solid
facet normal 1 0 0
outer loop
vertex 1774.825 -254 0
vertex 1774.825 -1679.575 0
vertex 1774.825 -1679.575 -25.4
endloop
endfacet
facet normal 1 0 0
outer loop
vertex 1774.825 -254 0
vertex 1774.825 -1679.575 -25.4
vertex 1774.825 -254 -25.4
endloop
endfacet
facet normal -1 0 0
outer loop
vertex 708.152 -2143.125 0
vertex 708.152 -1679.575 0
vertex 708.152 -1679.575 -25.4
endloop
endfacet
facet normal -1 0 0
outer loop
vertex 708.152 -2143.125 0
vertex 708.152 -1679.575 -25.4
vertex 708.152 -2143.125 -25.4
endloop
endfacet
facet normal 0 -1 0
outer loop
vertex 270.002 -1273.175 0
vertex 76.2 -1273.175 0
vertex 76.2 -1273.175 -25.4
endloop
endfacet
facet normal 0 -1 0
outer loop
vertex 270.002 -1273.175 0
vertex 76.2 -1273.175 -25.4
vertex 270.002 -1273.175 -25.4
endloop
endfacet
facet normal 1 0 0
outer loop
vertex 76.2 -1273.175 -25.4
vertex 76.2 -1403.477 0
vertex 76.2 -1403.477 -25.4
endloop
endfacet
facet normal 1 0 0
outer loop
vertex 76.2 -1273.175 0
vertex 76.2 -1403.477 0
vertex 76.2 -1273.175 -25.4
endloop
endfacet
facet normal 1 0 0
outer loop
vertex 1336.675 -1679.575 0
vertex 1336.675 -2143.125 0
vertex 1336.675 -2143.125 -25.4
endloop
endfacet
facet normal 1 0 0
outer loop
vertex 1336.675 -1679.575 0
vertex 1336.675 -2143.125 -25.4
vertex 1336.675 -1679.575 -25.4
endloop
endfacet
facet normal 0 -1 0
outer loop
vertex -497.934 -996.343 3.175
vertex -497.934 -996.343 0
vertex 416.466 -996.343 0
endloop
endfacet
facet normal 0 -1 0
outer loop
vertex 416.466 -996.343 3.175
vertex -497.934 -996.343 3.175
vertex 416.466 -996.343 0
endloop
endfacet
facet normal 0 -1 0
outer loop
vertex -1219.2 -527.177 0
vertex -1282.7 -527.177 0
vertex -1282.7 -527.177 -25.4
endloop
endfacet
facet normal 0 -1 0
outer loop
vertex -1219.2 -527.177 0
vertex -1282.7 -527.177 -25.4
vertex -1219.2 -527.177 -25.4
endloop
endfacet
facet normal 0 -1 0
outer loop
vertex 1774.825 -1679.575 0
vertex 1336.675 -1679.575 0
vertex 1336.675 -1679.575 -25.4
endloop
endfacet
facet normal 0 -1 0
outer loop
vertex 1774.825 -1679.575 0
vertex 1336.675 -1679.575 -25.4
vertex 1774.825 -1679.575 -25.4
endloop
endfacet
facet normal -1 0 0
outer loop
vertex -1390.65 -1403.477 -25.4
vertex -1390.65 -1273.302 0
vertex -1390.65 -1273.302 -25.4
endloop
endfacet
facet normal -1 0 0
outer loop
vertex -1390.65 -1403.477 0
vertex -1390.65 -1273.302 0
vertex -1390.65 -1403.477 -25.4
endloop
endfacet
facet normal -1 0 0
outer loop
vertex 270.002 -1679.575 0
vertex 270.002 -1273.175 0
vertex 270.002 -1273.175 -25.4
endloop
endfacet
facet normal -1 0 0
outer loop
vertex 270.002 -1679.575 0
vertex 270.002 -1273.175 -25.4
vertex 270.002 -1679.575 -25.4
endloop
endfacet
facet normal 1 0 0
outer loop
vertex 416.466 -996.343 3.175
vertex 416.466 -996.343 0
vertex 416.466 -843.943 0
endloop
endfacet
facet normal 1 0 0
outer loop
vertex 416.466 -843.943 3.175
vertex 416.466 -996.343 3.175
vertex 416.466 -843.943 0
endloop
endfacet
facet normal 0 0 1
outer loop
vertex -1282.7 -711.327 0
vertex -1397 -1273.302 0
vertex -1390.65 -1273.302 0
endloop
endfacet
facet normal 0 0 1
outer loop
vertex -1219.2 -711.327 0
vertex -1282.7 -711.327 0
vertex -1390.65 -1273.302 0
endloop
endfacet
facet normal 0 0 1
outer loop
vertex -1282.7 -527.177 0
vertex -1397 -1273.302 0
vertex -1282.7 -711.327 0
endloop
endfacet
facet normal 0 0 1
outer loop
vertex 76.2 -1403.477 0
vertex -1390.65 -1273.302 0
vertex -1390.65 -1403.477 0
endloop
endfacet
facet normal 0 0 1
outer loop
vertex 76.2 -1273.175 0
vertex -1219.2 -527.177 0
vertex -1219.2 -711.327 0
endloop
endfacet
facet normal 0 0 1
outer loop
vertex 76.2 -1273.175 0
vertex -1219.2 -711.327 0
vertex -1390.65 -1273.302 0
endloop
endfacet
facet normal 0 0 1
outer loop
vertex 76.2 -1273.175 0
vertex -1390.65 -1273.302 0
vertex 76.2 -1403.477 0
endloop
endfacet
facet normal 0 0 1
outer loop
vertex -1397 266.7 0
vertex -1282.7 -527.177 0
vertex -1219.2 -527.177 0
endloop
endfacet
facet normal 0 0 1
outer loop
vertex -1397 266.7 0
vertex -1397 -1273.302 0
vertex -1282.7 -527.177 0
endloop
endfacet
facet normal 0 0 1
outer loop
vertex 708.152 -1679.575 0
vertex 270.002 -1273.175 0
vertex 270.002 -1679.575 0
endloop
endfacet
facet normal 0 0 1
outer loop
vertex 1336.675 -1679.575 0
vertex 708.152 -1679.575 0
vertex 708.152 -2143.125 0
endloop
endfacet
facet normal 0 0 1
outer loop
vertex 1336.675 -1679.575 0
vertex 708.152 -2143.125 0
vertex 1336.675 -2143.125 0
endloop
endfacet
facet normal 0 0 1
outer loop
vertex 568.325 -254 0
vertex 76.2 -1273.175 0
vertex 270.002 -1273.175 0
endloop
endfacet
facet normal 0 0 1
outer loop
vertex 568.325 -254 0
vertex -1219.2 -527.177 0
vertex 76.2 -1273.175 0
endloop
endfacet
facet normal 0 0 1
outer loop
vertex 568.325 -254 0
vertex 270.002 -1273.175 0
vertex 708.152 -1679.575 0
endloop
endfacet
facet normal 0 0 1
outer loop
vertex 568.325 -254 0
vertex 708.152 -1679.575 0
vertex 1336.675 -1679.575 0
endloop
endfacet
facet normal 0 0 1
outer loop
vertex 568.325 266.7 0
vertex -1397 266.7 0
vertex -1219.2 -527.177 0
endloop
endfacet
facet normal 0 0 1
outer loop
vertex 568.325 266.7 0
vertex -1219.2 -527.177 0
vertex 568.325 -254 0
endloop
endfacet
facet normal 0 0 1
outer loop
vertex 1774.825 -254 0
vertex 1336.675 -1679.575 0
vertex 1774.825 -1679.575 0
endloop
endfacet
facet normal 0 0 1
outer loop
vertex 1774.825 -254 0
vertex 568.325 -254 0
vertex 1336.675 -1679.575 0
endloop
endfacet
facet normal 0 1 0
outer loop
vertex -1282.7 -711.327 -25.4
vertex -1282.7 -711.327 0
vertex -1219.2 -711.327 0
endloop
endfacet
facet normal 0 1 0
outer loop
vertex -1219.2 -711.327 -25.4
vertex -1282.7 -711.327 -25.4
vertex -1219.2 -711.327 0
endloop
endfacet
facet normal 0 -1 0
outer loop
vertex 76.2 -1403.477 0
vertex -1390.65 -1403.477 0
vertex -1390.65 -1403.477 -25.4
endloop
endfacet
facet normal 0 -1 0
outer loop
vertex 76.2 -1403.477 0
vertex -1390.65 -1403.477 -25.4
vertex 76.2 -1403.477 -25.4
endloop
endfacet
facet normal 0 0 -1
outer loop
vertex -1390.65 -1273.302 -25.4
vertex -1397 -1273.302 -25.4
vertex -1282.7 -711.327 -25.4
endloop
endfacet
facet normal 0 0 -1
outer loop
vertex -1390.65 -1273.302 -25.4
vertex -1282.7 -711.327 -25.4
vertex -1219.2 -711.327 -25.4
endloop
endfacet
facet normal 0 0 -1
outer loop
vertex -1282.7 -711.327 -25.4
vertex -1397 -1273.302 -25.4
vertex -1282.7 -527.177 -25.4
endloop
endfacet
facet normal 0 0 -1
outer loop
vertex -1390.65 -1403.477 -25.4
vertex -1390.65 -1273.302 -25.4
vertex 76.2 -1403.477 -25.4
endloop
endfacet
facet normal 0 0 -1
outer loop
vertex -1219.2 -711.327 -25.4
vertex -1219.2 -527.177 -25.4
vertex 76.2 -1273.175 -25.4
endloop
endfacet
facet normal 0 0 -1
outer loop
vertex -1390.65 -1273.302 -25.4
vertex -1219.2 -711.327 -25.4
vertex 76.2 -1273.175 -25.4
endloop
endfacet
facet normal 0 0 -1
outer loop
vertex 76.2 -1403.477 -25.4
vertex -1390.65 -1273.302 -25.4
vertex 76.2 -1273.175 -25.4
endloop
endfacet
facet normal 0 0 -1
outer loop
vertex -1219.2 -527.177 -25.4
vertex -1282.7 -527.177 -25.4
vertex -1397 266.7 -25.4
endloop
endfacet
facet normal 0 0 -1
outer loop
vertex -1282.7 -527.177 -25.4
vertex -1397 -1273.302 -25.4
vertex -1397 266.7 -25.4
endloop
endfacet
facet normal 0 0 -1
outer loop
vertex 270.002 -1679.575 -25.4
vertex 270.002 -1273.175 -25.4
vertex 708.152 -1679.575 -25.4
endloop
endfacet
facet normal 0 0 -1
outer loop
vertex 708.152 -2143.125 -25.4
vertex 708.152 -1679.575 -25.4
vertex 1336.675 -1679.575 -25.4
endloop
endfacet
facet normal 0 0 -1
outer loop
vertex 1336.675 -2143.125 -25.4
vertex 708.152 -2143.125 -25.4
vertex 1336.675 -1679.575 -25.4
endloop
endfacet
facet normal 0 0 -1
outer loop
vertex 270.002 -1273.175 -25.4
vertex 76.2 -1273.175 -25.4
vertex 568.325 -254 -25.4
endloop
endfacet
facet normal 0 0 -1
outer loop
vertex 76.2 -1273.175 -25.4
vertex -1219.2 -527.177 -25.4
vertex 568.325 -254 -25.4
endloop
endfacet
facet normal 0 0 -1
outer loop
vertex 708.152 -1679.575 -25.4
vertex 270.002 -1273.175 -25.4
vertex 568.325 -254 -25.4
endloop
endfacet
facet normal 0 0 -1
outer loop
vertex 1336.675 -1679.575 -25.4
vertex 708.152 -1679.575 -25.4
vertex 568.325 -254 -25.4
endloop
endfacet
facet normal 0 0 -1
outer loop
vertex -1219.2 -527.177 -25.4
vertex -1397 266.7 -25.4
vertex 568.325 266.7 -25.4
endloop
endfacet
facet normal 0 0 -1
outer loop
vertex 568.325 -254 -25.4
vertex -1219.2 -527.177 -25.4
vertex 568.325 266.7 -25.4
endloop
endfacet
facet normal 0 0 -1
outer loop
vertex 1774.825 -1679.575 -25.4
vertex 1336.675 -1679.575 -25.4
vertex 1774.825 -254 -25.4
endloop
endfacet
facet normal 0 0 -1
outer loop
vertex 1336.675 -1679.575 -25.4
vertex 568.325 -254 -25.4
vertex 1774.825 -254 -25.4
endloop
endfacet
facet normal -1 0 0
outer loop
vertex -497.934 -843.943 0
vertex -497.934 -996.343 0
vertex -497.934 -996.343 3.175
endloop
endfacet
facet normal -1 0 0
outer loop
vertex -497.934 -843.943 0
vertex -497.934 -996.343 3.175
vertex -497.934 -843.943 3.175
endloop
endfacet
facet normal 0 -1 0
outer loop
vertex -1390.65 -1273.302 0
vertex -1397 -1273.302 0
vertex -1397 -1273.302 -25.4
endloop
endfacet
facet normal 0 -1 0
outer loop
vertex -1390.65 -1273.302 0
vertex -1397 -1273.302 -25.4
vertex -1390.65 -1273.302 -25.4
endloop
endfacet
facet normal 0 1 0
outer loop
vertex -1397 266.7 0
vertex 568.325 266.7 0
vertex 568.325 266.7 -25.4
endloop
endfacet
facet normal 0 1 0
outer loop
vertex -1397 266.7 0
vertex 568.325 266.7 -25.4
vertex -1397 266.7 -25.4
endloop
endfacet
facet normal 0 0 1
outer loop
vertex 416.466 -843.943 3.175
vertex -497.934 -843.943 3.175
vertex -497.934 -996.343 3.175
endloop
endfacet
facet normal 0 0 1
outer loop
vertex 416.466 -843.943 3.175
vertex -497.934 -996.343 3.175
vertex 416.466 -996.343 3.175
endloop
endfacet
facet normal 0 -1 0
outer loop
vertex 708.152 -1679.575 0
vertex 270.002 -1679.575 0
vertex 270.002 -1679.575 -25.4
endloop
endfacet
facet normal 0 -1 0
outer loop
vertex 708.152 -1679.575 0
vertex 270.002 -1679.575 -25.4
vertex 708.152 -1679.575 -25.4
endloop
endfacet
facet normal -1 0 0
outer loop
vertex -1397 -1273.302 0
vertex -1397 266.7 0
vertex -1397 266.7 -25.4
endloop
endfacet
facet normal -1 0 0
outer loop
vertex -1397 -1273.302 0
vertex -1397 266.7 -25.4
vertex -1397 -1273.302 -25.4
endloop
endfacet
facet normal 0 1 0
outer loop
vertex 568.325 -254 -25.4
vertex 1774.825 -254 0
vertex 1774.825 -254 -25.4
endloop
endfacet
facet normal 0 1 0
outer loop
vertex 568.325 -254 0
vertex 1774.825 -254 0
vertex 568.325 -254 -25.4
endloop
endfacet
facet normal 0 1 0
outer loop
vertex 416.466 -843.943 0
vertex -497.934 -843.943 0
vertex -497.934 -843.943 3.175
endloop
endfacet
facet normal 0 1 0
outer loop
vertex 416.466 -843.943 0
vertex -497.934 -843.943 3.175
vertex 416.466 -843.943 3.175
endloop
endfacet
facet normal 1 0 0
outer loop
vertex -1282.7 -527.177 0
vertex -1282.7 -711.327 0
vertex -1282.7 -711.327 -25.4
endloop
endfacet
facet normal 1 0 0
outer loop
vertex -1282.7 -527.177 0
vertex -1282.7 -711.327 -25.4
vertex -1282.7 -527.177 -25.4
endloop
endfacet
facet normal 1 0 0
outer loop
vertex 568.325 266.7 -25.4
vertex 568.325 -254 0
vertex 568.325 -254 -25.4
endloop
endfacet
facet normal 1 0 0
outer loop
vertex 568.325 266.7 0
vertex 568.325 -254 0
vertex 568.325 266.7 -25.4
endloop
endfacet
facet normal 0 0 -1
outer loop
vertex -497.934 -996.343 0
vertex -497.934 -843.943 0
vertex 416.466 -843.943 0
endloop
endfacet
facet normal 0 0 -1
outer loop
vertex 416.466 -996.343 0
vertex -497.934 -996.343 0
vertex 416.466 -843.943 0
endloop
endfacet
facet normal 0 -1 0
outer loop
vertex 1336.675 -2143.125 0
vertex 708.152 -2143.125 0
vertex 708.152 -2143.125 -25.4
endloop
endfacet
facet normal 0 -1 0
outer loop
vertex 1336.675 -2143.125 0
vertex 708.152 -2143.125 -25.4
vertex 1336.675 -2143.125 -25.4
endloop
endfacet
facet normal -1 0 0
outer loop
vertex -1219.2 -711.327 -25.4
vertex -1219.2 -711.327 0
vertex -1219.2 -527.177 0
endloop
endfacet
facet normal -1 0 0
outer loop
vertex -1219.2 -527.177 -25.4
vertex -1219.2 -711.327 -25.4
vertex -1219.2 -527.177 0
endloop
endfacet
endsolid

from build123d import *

# Parameters (mm, degrees)
F0_W     = 63.5
F0_H     = 184.15
F1_DEPTH = 25.4
F2_W     = 914.4
F2_H     = 152.4
F3_DEPTH = 3.175


with BuildPart() as f1:
    # F0 (on Top) → F1 (new body)
    with BuildSketch(Plane.XY):
        Polygon((568.325, 266.7), (-1397, 266.7), (-1397, -1273.302), (-1390.65, -1273.302), (-1390.65, -1403.477), (76.2, -1403.477), (76.2, -1273.175), (270.002, -1273.175), (270.002, -1679.575), (708.152, -1679.575), (708.152, -2143.125), (1336.675, -2143.125), (1336.675, -1679.575), (1774.825, -1679.575), (1774.825, -254), (568.325, -254), align=None)
        with Locations((-1250.95, -619.252)):
            Rectangle(F0_W, F0_H, mode=Mode.SUBTRACT)
    extrude(amount=-F1_DEPTH)


with BuildPart() as f3:
    # F2 (on face) → F3 (new body)
    with BuildSketch(Plane.XY):
        with Locations((-40.733668, -920.143247)):
            Rectangle(F2_W, F2_H)
    extrude(amount=F3_DEPTH)


solid = Compound([f1.part, f3.part])
